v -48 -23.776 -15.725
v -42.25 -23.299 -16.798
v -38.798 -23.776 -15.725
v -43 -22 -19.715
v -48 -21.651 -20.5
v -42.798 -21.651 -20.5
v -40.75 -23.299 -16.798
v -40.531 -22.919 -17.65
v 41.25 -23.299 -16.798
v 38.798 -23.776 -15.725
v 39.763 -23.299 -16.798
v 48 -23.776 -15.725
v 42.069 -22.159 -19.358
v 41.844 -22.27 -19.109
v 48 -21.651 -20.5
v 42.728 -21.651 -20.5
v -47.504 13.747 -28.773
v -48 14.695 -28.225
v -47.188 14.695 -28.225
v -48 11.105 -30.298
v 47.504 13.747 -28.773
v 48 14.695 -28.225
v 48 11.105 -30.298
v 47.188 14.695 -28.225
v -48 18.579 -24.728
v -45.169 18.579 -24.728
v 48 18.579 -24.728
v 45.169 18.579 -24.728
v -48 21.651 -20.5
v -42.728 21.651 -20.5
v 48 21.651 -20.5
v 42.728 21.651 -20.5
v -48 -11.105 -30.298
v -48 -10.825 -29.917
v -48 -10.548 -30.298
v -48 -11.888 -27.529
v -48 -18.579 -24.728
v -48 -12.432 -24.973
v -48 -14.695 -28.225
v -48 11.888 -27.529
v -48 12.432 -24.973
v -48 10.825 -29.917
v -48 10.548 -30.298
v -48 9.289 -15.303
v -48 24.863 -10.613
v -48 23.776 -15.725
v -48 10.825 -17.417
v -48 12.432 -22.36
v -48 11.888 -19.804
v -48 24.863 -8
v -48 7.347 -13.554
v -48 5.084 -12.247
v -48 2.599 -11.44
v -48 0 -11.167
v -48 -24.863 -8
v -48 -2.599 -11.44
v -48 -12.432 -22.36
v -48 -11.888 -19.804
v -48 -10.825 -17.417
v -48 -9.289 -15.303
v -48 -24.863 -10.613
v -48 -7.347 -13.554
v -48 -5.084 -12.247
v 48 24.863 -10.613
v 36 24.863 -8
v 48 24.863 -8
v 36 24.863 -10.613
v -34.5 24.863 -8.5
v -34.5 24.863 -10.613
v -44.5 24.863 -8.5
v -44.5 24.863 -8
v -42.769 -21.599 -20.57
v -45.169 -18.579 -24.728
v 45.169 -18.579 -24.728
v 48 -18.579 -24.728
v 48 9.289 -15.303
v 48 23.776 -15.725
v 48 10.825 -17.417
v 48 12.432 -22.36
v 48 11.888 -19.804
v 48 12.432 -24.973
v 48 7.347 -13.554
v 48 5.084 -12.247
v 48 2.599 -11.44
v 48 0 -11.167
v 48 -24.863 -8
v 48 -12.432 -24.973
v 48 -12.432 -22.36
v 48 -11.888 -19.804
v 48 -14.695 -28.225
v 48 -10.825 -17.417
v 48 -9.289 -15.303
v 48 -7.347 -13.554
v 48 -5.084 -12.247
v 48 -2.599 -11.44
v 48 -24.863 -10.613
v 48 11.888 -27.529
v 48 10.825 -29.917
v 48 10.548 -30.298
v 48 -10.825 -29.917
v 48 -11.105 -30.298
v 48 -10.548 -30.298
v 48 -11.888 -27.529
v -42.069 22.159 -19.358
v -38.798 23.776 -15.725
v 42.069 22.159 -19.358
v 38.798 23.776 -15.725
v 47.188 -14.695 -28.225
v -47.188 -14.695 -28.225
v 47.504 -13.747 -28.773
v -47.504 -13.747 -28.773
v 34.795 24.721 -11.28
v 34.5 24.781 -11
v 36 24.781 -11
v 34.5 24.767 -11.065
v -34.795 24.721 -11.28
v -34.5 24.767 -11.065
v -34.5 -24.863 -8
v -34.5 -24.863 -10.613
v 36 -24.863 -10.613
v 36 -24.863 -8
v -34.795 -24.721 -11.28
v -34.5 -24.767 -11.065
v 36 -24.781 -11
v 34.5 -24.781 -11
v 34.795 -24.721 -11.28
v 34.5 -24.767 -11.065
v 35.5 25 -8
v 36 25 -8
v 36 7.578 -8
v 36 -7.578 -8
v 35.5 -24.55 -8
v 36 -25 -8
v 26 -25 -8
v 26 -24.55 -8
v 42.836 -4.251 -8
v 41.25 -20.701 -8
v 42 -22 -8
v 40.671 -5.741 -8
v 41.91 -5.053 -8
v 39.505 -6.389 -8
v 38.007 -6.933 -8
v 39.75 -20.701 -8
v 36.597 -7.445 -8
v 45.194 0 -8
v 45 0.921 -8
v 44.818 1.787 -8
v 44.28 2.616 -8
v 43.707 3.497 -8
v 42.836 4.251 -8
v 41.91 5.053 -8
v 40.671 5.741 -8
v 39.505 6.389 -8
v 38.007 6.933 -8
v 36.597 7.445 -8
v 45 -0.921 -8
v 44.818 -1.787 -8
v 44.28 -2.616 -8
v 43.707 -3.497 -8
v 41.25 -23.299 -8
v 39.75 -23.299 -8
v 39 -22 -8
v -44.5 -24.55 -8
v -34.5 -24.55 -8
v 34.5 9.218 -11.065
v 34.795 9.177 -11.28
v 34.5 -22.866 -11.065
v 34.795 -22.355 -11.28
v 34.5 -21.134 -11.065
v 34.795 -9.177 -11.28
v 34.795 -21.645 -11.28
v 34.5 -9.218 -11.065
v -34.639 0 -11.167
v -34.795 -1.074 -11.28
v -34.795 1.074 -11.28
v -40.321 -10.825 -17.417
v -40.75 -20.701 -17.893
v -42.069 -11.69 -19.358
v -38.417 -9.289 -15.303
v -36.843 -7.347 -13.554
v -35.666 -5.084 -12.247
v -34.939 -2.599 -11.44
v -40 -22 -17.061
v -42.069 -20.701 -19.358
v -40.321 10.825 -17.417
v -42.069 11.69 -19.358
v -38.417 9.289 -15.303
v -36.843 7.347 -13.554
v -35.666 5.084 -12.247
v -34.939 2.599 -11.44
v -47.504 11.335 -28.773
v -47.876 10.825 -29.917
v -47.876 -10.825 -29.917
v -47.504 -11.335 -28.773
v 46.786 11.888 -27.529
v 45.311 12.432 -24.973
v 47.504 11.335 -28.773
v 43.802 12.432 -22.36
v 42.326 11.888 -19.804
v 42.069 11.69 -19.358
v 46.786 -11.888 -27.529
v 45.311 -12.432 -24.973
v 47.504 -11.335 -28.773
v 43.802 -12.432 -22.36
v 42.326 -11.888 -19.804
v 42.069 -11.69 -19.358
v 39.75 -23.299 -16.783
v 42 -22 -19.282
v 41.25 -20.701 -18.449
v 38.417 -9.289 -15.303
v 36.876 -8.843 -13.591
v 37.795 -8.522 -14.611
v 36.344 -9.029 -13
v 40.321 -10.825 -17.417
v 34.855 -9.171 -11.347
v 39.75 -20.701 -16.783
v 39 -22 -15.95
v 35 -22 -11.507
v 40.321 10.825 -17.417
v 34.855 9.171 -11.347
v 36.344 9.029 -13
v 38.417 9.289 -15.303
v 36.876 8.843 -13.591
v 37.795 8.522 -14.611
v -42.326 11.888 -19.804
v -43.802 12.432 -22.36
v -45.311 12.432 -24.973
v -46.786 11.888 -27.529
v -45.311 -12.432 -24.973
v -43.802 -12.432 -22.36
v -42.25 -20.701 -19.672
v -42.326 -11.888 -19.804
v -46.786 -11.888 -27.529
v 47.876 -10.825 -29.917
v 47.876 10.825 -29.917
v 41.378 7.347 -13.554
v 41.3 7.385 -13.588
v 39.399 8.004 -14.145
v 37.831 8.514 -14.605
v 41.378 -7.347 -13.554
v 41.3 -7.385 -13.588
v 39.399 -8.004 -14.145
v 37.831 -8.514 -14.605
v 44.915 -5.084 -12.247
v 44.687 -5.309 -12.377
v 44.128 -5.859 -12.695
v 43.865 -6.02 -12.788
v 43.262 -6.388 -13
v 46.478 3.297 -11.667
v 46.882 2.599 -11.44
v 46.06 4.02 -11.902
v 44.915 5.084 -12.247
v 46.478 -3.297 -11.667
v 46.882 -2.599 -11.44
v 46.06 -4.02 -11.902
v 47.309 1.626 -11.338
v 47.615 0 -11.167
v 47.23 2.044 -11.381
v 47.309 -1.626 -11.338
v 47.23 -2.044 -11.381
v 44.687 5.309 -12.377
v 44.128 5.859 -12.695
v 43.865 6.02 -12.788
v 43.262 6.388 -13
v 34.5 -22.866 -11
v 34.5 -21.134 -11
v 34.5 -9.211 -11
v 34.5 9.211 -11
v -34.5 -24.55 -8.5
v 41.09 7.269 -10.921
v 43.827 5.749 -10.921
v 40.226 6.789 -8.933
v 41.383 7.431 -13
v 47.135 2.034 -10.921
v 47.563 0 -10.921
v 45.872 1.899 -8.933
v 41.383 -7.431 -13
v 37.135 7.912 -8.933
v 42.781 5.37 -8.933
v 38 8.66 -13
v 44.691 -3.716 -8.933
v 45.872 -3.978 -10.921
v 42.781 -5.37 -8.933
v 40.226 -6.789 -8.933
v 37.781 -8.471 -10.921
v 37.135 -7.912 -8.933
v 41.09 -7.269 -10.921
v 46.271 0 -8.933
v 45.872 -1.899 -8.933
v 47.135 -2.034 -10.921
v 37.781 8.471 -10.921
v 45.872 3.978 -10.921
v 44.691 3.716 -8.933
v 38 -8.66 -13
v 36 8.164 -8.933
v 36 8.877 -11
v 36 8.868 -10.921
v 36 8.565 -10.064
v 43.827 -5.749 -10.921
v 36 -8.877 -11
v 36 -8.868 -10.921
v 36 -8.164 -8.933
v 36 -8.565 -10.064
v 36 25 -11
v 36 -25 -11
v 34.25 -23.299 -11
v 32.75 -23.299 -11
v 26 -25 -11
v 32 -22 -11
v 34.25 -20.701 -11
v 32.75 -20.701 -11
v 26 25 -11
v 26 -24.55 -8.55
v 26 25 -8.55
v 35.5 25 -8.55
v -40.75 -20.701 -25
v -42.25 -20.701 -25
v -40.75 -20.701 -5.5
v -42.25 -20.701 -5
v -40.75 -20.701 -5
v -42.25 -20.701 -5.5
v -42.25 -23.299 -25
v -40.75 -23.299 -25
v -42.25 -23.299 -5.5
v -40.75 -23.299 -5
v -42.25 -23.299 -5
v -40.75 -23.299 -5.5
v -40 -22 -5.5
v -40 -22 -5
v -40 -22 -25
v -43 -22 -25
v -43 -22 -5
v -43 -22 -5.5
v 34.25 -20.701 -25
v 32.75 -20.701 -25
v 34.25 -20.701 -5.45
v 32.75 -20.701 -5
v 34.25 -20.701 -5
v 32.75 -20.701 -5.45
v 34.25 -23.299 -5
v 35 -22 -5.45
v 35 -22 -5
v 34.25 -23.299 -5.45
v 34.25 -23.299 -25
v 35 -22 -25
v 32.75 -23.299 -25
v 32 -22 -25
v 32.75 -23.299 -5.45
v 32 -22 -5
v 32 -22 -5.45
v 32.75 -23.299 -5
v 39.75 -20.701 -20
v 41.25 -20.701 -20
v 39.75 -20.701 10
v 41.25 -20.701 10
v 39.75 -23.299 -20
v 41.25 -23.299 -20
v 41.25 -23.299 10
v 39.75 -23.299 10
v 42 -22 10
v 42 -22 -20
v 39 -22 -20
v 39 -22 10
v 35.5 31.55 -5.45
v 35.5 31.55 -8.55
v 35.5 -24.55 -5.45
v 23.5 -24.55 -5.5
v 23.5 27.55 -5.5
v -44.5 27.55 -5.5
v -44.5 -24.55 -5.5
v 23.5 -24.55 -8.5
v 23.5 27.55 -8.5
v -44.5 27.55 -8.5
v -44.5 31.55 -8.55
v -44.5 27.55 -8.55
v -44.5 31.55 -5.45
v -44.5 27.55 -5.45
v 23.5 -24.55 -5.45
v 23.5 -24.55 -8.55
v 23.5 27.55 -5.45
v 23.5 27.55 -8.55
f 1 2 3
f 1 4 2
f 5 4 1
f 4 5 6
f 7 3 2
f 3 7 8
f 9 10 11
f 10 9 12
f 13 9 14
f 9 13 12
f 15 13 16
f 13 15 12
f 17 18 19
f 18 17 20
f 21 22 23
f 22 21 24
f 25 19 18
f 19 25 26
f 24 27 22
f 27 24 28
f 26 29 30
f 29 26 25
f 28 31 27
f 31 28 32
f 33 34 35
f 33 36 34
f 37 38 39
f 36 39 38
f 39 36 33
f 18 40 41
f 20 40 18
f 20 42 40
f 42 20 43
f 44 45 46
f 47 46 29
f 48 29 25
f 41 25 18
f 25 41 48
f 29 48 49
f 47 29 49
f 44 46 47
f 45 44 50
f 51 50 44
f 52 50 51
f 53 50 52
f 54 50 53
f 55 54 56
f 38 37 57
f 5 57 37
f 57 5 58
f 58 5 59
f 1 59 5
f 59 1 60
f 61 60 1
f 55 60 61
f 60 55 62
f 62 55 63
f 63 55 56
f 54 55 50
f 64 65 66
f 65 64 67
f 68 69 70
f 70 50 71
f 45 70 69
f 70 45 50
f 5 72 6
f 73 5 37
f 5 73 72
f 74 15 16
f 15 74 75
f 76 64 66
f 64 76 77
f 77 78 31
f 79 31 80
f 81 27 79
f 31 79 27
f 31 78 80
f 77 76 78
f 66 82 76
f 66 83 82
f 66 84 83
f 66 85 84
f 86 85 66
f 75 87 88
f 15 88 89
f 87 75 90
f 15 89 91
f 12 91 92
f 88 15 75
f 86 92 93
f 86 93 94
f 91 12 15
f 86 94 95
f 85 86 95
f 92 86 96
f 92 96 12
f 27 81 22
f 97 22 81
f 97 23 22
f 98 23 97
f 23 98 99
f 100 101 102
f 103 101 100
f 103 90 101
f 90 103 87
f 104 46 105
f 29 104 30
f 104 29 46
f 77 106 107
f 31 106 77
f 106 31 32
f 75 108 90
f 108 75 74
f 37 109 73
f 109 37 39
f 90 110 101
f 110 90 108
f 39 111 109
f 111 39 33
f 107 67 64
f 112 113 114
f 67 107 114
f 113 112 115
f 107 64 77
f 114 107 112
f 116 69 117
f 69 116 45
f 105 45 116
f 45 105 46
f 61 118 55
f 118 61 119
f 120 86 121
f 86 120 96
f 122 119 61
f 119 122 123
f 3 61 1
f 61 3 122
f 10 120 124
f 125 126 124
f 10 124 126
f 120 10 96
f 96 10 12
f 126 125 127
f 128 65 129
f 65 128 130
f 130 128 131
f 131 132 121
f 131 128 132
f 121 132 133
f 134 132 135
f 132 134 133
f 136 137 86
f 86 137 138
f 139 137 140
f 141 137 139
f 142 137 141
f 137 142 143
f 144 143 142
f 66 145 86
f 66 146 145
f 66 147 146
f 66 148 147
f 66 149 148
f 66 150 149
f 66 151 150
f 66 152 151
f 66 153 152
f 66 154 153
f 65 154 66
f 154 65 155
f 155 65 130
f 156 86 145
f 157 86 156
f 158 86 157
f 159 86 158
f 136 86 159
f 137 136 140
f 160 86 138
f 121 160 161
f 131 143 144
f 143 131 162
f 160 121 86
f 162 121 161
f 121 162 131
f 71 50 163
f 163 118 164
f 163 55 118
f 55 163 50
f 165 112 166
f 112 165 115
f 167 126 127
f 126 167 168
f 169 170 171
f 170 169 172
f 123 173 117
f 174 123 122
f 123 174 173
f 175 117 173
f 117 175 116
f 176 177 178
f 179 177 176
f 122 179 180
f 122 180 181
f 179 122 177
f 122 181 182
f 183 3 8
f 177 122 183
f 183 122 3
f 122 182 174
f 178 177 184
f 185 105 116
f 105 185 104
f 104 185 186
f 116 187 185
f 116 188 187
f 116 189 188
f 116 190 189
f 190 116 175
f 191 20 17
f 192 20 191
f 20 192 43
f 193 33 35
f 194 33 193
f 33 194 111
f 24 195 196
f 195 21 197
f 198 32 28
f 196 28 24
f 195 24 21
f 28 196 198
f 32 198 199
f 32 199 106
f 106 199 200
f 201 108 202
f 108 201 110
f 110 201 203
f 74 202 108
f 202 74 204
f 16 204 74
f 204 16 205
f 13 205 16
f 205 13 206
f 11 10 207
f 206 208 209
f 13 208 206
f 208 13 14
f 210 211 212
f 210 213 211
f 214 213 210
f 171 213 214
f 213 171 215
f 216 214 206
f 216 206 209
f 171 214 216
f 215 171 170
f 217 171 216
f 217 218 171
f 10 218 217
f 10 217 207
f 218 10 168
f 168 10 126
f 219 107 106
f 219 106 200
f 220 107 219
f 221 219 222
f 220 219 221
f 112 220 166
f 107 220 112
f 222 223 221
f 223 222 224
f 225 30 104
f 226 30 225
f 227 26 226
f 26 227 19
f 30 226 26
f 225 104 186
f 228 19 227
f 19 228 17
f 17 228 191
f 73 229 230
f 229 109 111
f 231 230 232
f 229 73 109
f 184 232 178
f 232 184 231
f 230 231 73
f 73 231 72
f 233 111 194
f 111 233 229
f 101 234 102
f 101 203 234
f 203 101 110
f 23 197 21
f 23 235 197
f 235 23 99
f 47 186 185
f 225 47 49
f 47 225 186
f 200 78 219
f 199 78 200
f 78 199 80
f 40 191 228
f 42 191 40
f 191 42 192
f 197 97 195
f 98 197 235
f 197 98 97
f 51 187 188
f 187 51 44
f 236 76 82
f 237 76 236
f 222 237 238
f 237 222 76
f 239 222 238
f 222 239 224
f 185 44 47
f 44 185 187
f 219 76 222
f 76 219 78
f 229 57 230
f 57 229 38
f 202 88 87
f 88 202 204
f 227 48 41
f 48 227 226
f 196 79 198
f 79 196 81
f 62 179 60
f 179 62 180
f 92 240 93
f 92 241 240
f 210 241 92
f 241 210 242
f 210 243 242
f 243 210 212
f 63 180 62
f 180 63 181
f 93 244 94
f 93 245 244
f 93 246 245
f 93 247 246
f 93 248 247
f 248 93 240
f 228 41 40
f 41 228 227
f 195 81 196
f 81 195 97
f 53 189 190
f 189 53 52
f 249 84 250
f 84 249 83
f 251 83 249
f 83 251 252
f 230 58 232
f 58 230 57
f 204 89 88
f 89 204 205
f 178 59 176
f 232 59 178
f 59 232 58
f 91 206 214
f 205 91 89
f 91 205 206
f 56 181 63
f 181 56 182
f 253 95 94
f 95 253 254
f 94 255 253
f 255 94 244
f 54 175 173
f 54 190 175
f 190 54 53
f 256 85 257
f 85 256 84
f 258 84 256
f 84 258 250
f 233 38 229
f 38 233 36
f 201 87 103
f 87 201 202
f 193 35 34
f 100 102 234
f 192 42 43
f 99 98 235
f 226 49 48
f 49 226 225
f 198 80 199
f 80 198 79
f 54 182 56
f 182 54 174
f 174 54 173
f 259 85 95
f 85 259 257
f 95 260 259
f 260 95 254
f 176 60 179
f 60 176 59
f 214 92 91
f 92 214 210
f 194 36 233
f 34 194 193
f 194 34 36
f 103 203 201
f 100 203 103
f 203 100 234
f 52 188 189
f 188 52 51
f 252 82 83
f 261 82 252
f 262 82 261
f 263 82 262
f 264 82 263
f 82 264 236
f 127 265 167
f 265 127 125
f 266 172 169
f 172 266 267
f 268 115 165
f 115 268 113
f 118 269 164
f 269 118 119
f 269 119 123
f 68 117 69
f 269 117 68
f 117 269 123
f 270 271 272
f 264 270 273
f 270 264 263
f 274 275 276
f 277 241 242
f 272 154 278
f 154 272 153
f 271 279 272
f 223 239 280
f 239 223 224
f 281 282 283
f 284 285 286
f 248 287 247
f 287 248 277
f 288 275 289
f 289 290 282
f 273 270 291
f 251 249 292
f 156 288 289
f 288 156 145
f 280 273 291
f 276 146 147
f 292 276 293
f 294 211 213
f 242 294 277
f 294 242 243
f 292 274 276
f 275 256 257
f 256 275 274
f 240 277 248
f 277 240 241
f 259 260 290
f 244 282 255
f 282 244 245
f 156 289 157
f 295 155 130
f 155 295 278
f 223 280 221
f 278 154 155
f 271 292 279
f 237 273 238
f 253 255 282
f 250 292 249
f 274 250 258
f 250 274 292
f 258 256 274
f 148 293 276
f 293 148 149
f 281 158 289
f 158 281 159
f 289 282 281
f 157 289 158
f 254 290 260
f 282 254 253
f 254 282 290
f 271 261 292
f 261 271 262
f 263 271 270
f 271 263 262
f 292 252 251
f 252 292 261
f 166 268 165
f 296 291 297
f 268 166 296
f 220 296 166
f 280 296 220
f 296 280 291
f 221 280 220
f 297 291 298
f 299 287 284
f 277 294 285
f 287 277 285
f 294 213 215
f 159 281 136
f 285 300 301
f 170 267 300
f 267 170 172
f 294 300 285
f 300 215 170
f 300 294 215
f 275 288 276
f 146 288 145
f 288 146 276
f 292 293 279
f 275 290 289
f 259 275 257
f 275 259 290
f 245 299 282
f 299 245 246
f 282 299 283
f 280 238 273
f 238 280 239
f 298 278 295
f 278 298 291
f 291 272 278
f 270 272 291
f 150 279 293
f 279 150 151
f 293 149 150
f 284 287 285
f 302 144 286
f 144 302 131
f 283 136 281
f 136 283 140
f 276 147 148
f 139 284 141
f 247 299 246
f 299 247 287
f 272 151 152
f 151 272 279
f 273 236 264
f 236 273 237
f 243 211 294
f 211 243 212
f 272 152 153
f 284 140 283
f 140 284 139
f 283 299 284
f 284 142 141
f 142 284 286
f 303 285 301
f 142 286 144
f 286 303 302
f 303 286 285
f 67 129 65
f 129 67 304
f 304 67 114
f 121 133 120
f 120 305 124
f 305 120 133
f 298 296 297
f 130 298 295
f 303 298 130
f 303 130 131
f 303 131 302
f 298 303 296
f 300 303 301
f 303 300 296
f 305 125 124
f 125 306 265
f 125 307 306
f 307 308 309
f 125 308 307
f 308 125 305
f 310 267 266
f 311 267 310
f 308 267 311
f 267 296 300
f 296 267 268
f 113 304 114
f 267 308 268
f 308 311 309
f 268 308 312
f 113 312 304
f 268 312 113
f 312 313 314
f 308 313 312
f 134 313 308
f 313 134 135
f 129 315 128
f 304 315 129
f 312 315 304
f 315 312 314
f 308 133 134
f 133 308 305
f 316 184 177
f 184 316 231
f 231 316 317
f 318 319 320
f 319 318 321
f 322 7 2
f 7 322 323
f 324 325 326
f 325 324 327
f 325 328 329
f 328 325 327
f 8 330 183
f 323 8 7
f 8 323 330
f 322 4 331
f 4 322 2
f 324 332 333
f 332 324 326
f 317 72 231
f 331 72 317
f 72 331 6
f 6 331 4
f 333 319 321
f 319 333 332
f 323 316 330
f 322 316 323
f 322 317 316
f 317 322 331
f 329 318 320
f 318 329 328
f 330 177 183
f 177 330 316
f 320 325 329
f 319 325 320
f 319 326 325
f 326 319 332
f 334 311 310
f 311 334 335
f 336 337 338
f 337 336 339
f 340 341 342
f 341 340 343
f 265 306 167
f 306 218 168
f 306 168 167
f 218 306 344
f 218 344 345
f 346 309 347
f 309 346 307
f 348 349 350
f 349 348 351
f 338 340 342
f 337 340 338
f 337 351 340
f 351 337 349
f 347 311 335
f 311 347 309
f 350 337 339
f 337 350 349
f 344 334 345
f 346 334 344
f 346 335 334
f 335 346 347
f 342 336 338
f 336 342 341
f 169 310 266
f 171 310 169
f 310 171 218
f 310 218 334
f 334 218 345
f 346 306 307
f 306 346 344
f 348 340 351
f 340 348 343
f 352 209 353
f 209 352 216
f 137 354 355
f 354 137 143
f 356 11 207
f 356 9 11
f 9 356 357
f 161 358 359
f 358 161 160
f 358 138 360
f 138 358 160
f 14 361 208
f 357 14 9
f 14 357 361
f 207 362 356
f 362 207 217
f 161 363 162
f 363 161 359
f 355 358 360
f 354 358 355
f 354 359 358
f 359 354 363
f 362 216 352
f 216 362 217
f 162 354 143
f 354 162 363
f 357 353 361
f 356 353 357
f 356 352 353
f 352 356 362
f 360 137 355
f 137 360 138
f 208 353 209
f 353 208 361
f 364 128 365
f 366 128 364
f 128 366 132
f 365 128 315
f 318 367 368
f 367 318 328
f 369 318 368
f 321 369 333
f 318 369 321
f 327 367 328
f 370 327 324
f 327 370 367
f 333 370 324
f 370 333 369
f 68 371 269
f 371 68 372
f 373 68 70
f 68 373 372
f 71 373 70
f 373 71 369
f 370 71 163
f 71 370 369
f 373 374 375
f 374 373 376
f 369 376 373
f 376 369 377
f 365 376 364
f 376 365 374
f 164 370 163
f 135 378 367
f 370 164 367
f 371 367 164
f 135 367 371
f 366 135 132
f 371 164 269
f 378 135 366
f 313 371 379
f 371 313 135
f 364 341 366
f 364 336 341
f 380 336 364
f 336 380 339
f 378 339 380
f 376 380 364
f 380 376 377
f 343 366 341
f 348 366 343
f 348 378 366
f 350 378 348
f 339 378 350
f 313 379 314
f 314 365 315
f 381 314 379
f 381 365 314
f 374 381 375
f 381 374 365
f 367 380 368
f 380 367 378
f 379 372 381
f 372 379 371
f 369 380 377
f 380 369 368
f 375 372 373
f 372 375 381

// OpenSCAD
// file: M3.scad
module M3_hole( pos=[0, 0, 0], depth = 10, invert=false) {
    color("cyan")
    translate( pos)
    if( invert) {
        rotate([180, 0, 0])
        cylinder(r1=1.5, r2=1.5, depth, center=false, $fn=6);
    }
    else {
        cylinder(r1=1.5, r2=1.5, depth, center=false, $fn=6);
    }
}

M3_hole();
// main file
use <M3.scad>

module support_keyboard( length, width) {
    translate([0,0, -8])  {
    difference() 
    {
    rotate([0, -90, 0])
    difference() 
    {
        cylinder(r=width/2, h=length, center=true);
        //cube([length/2, width, 96], center=true);
        
        w = length + 1;
        color("lightblue")
        translate([w/2,0,0]) 
        cube(w, center=true);
    } 

    r = length / 2;
    
    color("red")
    translate([0,0, -r/1.3 -5]) 
    rotate([90, 0, 0])
    cylinder(r=r+4, h=width+1, center=true);

    color("blue")
    translate([0,0,-width/3 + 1]) 
    rotate([0, 90, 0])
    cylinder(r=width/4, h=length+10, center=true);

    color("yellow")
    cube(length-27, center=true);

    color("green")
    translate([length/2 - 20, 0, -5])
    scale([2.0,1.0,1.0])
    sphere(r=10, h=width+1, center=true);
    
    }
    
    // extension to support keyboard
    color("green")
    translate([31, 0, -1.5])  
    cube([ 10, width, 3], center=true);

    }
}


module keyboard_impl( mat = false, hole=false, equip = false) {
    
  width=96;
    
  if( mat) {
    support_keyboard( length=width, width=50);
  }

  translate([5 -width/2 + 1.5, 3.5, 0]) {
  if( hole)
  {
      
      // keyboard hole
       translate([0, 0, -5])
      {
        M3_hole([0, -25.5, 0], depth=20, invert=true);
        //M3_hole([0, 25.5, 0],  depth=20, invert=true);
        M3_hole([75, -25.5, 0], depth=20, invert=true);
        //M3_hole([75, 25.5, 0], depth=20, invert=true); 
      }
      
      // cover mount hole
      color("red")
      translate([0, 0, 10])
      M3_hole([82, -25.5, 0], depth=30, invert=true);
  }
  
   if( equip) {
       l=80;
       w=56.10;
       d=6;
       
       translate([(l-d)/2, 0, -7]) {
           
            cube([ l, w, 3], center=true);
              
            a = 12;
            b = 4;
            color("black")
            translate([(l-a)/2, 0, 0])
            cube([ a, w, 3.1], center=true);
            
            color("black")
            translate([ 0, (w-b)/2, 0])
            cube([ l, b, 3.1], center=true);   
       }
   }
  }
  
  
}

module keyboard( mat = false, hole=false, equip = false) {
    
    if( mat) 
        keyboard_impl( mat=mat);
    
    if( hole) 
        keyboard_impl( hole=hole);
    
    if( equip) {
        difference() {
            
           keyboard_impl( equip=equip);
           keyboard_impl( hole=true);

        }
    }
        
        
}

keyboard( mat=true, hole=true, equip=true);
//keyboard(equip=true);
